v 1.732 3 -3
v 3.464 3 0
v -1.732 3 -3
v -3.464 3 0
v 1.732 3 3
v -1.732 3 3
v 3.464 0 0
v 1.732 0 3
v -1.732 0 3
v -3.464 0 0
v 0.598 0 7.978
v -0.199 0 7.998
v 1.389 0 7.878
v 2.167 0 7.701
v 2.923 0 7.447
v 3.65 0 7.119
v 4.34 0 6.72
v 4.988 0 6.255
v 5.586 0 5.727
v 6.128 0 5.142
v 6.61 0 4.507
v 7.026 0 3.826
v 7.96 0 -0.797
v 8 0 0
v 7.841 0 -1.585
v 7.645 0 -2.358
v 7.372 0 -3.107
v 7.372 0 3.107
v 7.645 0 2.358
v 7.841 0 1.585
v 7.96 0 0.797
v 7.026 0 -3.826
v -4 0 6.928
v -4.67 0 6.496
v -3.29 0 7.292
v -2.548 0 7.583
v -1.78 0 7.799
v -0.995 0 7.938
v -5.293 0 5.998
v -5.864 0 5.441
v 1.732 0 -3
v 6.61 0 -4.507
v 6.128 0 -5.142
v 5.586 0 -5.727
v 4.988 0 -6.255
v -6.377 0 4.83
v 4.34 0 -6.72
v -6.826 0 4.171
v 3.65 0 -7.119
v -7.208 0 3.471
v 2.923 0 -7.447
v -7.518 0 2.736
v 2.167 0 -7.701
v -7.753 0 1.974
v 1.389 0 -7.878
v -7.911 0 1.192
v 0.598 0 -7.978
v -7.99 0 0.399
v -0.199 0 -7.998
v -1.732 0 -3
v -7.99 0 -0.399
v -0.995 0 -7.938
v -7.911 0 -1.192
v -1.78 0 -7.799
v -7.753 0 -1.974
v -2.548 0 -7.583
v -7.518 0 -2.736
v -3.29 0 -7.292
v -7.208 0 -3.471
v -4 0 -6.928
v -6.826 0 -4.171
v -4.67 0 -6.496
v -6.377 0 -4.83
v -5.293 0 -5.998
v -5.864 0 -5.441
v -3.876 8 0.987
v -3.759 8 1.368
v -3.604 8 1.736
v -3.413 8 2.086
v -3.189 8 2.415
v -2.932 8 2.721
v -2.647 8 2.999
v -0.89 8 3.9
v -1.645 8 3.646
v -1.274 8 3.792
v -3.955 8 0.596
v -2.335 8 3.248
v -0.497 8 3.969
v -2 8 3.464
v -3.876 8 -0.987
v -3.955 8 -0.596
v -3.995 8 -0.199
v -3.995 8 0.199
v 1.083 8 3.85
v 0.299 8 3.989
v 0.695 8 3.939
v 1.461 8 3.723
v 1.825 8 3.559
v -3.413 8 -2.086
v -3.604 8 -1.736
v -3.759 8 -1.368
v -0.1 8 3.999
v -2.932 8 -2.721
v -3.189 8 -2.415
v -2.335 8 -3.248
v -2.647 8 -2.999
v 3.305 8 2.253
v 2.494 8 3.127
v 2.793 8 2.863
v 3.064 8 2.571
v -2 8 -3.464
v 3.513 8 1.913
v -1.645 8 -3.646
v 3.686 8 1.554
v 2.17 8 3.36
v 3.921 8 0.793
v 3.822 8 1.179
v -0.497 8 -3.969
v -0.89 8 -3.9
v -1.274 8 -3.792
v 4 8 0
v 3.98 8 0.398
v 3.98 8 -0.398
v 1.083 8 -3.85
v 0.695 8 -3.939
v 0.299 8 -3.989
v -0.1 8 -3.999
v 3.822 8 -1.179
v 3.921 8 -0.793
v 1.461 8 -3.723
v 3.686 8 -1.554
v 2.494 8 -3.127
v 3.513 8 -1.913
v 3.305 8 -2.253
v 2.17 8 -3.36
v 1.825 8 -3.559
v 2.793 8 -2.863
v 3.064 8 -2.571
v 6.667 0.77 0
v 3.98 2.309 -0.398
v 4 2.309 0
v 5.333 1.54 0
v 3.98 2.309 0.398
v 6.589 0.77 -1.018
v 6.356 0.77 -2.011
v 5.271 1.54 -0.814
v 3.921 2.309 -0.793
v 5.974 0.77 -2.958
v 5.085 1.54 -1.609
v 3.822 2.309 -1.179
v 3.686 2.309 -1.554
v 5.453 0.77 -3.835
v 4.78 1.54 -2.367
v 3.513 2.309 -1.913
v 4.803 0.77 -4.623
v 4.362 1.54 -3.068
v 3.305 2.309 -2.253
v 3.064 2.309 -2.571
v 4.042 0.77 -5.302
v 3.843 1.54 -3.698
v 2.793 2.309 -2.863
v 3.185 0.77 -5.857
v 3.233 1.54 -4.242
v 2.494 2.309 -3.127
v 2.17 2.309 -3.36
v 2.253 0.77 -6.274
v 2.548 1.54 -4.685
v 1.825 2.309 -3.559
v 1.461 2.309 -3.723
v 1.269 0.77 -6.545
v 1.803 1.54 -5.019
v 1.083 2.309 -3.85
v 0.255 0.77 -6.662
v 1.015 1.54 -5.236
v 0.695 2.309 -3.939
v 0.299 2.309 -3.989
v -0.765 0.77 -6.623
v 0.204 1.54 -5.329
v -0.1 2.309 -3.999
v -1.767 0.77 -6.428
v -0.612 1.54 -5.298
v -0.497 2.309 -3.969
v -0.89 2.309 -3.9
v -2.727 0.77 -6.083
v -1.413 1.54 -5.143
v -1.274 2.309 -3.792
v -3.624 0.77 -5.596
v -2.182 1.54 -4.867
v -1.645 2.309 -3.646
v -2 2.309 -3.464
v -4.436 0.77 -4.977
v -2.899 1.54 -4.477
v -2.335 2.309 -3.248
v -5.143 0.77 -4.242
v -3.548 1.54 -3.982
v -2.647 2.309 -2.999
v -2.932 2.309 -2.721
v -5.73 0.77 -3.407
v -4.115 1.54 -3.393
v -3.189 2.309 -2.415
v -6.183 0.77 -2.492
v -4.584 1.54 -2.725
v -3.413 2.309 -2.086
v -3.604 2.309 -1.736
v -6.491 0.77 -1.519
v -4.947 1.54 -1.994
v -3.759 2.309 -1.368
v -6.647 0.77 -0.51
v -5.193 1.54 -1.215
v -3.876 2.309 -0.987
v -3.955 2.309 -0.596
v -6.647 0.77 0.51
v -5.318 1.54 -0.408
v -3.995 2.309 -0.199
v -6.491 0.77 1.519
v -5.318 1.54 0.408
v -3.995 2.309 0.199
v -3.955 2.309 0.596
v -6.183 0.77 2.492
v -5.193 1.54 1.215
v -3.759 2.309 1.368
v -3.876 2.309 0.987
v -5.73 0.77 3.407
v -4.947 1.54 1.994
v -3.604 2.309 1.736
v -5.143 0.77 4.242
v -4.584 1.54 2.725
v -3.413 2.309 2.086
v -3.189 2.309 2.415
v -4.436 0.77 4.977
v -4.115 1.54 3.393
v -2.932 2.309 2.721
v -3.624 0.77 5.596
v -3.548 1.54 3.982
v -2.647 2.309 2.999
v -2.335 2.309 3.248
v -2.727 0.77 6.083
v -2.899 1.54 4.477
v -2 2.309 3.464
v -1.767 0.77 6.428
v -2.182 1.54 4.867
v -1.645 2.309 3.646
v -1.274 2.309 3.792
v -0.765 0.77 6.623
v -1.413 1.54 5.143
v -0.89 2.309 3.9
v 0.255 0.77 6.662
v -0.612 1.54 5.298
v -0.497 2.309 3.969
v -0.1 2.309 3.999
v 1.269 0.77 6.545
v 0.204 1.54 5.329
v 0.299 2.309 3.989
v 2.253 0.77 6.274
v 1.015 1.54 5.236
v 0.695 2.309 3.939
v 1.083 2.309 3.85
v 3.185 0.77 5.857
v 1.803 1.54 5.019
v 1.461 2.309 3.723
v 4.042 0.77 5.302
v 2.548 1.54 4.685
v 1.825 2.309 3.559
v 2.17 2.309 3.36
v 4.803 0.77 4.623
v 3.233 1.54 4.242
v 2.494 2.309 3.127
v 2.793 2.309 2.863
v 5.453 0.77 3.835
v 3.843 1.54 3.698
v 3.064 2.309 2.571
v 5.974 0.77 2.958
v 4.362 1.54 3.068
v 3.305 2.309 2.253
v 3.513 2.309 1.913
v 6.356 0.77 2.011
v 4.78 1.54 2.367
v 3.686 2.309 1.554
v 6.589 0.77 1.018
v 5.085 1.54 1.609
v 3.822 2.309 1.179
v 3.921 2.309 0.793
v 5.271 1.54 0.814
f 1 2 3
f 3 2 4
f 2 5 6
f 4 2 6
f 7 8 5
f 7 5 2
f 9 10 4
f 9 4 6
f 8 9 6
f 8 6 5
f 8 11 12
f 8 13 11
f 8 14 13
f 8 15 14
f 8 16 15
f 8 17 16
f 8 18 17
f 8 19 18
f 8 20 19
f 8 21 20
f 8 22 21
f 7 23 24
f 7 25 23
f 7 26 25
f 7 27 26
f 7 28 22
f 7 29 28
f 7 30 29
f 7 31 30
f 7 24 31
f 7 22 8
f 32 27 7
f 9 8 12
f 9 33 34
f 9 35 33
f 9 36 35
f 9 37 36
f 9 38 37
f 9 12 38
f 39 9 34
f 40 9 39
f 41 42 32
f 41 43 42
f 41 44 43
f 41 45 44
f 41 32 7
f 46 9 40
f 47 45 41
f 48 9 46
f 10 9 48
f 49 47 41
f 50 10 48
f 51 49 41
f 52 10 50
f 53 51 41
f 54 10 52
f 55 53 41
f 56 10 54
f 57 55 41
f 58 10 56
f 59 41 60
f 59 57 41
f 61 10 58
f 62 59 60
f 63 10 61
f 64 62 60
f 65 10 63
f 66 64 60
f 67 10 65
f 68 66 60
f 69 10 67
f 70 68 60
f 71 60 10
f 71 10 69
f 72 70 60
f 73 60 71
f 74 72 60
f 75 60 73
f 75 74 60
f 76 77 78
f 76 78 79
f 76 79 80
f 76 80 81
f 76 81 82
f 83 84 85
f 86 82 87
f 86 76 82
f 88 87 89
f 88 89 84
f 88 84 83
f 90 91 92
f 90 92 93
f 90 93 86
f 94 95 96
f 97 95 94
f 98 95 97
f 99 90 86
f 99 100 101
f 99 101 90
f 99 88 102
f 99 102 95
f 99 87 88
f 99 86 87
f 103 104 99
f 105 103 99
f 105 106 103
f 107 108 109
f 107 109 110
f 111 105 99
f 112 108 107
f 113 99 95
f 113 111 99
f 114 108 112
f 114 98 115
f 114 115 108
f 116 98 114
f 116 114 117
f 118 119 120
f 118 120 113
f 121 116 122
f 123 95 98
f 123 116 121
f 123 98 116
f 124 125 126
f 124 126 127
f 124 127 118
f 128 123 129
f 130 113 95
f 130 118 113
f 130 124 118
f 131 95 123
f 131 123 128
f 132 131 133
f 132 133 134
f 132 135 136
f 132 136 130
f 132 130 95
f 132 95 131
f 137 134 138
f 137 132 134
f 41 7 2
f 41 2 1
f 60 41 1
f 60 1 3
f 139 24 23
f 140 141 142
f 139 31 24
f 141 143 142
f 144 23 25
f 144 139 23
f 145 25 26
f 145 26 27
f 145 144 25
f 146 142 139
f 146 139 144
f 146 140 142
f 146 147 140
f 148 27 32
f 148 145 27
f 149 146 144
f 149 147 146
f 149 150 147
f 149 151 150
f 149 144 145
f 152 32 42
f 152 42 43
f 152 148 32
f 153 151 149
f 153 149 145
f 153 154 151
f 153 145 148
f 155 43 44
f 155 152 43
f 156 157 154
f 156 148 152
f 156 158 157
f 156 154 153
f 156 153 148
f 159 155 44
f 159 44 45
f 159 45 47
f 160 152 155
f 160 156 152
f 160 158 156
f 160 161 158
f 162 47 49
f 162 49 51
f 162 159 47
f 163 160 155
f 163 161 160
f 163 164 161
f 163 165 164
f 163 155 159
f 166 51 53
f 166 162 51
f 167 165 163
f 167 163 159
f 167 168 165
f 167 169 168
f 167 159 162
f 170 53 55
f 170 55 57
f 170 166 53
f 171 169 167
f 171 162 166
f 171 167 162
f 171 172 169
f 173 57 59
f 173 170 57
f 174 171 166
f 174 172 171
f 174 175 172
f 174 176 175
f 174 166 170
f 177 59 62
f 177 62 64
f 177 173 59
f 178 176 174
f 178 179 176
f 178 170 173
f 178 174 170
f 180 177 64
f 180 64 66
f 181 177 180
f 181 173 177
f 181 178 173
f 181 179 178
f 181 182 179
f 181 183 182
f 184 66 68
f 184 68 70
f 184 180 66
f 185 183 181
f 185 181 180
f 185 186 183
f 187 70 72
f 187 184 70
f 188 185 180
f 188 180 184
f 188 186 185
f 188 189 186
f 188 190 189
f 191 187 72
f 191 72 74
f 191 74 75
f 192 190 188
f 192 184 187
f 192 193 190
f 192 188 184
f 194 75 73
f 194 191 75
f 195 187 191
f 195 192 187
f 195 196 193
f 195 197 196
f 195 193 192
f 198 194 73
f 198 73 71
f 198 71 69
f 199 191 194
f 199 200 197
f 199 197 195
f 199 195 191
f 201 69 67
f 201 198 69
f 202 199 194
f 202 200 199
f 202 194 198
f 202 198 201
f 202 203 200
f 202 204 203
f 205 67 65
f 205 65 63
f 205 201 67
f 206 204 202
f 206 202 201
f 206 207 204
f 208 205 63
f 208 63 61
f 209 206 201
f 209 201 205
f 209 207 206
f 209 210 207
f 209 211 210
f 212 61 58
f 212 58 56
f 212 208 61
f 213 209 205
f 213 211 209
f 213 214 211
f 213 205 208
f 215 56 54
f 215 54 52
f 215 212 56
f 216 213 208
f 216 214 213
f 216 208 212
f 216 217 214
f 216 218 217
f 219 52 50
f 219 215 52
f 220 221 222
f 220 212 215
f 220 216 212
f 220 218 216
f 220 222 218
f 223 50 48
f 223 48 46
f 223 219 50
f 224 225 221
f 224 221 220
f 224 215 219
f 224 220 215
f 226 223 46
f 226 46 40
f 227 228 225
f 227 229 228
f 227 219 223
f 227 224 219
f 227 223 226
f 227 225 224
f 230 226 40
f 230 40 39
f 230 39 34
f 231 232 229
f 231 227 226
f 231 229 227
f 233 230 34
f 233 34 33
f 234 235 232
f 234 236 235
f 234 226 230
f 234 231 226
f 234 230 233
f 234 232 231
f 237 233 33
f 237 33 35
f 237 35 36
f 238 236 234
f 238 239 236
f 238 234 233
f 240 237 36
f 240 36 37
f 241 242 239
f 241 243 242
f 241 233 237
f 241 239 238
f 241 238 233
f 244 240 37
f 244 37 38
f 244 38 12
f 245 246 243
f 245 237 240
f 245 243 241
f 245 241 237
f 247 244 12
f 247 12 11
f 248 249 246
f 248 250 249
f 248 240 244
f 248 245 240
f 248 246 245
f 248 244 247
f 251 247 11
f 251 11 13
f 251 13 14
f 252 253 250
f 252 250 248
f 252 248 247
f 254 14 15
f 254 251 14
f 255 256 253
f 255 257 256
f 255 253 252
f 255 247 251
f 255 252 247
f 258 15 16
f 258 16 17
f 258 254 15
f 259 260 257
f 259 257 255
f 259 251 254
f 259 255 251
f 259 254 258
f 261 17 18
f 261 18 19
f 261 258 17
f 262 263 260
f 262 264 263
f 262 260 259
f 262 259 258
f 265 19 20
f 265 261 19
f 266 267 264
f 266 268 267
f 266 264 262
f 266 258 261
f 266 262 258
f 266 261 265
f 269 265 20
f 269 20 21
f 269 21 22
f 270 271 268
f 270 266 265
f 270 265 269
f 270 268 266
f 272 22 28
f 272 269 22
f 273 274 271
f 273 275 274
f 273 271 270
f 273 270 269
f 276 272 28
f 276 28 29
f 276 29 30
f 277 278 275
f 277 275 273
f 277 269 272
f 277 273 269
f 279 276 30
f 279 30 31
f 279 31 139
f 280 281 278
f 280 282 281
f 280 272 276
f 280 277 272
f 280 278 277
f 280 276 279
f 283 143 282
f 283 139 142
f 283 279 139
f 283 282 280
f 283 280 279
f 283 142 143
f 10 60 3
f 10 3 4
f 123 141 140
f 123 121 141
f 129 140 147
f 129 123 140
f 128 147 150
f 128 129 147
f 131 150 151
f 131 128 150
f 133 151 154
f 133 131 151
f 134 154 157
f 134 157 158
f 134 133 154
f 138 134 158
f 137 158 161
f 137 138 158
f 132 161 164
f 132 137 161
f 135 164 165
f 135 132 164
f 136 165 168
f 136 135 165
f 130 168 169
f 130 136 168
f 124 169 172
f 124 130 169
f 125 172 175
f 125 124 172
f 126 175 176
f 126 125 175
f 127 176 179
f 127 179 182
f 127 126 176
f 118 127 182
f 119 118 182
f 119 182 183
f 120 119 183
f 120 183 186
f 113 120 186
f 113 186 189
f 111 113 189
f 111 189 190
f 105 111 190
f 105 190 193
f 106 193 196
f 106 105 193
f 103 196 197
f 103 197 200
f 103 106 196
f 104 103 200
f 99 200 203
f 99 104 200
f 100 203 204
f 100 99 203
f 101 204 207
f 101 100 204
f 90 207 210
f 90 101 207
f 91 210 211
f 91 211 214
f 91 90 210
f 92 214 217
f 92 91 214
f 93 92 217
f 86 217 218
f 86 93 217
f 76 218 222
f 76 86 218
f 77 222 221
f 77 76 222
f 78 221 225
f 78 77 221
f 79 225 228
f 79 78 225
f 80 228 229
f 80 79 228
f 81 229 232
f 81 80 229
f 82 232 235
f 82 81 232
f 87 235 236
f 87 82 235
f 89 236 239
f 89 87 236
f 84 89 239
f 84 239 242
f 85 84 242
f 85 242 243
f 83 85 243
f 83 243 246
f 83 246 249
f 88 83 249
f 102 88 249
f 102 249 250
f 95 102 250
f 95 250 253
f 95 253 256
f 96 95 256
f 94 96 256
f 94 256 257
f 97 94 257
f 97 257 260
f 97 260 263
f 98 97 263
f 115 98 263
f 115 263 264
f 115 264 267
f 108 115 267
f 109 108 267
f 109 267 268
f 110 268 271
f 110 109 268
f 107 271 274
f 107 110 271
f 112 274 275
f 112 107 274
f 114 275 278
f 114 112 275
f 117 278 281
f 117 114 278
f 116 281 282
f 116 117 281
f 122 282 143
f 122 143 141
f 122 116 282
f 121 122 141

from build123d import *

# Parameters (mm, degrees)
ENL_V_MAT_EXTRU_1_DEPTH = 3


with BuildPart() as part:
    # Esquisse1 → Révolution1 (revolve)
    with BuildSketch(Plane.XY):
        Polygon((0, 0), (8, 0), (4, 2.309401077), (4, 8), (0, 8), align=None)
    revolve(axis=Axis((0, 0, 0), (0, 1, 0)))

    # Esquisse2 → Enlèv. mat.-Extru.1 (cut)
    with BuildSketch(Plane.XZ):
        Polygon((-3.464101615, 0), (-1.732050808, 3), (1.732050808, 3), (3.464101615, 0), (1.732050808, -3), (-1.732050808, -3), align=None)
    extrude(amount=-ENL_V_MAT_EXTRU_1_DEPTH, mode=Mode.SUBTRACT)


solid = part.part
